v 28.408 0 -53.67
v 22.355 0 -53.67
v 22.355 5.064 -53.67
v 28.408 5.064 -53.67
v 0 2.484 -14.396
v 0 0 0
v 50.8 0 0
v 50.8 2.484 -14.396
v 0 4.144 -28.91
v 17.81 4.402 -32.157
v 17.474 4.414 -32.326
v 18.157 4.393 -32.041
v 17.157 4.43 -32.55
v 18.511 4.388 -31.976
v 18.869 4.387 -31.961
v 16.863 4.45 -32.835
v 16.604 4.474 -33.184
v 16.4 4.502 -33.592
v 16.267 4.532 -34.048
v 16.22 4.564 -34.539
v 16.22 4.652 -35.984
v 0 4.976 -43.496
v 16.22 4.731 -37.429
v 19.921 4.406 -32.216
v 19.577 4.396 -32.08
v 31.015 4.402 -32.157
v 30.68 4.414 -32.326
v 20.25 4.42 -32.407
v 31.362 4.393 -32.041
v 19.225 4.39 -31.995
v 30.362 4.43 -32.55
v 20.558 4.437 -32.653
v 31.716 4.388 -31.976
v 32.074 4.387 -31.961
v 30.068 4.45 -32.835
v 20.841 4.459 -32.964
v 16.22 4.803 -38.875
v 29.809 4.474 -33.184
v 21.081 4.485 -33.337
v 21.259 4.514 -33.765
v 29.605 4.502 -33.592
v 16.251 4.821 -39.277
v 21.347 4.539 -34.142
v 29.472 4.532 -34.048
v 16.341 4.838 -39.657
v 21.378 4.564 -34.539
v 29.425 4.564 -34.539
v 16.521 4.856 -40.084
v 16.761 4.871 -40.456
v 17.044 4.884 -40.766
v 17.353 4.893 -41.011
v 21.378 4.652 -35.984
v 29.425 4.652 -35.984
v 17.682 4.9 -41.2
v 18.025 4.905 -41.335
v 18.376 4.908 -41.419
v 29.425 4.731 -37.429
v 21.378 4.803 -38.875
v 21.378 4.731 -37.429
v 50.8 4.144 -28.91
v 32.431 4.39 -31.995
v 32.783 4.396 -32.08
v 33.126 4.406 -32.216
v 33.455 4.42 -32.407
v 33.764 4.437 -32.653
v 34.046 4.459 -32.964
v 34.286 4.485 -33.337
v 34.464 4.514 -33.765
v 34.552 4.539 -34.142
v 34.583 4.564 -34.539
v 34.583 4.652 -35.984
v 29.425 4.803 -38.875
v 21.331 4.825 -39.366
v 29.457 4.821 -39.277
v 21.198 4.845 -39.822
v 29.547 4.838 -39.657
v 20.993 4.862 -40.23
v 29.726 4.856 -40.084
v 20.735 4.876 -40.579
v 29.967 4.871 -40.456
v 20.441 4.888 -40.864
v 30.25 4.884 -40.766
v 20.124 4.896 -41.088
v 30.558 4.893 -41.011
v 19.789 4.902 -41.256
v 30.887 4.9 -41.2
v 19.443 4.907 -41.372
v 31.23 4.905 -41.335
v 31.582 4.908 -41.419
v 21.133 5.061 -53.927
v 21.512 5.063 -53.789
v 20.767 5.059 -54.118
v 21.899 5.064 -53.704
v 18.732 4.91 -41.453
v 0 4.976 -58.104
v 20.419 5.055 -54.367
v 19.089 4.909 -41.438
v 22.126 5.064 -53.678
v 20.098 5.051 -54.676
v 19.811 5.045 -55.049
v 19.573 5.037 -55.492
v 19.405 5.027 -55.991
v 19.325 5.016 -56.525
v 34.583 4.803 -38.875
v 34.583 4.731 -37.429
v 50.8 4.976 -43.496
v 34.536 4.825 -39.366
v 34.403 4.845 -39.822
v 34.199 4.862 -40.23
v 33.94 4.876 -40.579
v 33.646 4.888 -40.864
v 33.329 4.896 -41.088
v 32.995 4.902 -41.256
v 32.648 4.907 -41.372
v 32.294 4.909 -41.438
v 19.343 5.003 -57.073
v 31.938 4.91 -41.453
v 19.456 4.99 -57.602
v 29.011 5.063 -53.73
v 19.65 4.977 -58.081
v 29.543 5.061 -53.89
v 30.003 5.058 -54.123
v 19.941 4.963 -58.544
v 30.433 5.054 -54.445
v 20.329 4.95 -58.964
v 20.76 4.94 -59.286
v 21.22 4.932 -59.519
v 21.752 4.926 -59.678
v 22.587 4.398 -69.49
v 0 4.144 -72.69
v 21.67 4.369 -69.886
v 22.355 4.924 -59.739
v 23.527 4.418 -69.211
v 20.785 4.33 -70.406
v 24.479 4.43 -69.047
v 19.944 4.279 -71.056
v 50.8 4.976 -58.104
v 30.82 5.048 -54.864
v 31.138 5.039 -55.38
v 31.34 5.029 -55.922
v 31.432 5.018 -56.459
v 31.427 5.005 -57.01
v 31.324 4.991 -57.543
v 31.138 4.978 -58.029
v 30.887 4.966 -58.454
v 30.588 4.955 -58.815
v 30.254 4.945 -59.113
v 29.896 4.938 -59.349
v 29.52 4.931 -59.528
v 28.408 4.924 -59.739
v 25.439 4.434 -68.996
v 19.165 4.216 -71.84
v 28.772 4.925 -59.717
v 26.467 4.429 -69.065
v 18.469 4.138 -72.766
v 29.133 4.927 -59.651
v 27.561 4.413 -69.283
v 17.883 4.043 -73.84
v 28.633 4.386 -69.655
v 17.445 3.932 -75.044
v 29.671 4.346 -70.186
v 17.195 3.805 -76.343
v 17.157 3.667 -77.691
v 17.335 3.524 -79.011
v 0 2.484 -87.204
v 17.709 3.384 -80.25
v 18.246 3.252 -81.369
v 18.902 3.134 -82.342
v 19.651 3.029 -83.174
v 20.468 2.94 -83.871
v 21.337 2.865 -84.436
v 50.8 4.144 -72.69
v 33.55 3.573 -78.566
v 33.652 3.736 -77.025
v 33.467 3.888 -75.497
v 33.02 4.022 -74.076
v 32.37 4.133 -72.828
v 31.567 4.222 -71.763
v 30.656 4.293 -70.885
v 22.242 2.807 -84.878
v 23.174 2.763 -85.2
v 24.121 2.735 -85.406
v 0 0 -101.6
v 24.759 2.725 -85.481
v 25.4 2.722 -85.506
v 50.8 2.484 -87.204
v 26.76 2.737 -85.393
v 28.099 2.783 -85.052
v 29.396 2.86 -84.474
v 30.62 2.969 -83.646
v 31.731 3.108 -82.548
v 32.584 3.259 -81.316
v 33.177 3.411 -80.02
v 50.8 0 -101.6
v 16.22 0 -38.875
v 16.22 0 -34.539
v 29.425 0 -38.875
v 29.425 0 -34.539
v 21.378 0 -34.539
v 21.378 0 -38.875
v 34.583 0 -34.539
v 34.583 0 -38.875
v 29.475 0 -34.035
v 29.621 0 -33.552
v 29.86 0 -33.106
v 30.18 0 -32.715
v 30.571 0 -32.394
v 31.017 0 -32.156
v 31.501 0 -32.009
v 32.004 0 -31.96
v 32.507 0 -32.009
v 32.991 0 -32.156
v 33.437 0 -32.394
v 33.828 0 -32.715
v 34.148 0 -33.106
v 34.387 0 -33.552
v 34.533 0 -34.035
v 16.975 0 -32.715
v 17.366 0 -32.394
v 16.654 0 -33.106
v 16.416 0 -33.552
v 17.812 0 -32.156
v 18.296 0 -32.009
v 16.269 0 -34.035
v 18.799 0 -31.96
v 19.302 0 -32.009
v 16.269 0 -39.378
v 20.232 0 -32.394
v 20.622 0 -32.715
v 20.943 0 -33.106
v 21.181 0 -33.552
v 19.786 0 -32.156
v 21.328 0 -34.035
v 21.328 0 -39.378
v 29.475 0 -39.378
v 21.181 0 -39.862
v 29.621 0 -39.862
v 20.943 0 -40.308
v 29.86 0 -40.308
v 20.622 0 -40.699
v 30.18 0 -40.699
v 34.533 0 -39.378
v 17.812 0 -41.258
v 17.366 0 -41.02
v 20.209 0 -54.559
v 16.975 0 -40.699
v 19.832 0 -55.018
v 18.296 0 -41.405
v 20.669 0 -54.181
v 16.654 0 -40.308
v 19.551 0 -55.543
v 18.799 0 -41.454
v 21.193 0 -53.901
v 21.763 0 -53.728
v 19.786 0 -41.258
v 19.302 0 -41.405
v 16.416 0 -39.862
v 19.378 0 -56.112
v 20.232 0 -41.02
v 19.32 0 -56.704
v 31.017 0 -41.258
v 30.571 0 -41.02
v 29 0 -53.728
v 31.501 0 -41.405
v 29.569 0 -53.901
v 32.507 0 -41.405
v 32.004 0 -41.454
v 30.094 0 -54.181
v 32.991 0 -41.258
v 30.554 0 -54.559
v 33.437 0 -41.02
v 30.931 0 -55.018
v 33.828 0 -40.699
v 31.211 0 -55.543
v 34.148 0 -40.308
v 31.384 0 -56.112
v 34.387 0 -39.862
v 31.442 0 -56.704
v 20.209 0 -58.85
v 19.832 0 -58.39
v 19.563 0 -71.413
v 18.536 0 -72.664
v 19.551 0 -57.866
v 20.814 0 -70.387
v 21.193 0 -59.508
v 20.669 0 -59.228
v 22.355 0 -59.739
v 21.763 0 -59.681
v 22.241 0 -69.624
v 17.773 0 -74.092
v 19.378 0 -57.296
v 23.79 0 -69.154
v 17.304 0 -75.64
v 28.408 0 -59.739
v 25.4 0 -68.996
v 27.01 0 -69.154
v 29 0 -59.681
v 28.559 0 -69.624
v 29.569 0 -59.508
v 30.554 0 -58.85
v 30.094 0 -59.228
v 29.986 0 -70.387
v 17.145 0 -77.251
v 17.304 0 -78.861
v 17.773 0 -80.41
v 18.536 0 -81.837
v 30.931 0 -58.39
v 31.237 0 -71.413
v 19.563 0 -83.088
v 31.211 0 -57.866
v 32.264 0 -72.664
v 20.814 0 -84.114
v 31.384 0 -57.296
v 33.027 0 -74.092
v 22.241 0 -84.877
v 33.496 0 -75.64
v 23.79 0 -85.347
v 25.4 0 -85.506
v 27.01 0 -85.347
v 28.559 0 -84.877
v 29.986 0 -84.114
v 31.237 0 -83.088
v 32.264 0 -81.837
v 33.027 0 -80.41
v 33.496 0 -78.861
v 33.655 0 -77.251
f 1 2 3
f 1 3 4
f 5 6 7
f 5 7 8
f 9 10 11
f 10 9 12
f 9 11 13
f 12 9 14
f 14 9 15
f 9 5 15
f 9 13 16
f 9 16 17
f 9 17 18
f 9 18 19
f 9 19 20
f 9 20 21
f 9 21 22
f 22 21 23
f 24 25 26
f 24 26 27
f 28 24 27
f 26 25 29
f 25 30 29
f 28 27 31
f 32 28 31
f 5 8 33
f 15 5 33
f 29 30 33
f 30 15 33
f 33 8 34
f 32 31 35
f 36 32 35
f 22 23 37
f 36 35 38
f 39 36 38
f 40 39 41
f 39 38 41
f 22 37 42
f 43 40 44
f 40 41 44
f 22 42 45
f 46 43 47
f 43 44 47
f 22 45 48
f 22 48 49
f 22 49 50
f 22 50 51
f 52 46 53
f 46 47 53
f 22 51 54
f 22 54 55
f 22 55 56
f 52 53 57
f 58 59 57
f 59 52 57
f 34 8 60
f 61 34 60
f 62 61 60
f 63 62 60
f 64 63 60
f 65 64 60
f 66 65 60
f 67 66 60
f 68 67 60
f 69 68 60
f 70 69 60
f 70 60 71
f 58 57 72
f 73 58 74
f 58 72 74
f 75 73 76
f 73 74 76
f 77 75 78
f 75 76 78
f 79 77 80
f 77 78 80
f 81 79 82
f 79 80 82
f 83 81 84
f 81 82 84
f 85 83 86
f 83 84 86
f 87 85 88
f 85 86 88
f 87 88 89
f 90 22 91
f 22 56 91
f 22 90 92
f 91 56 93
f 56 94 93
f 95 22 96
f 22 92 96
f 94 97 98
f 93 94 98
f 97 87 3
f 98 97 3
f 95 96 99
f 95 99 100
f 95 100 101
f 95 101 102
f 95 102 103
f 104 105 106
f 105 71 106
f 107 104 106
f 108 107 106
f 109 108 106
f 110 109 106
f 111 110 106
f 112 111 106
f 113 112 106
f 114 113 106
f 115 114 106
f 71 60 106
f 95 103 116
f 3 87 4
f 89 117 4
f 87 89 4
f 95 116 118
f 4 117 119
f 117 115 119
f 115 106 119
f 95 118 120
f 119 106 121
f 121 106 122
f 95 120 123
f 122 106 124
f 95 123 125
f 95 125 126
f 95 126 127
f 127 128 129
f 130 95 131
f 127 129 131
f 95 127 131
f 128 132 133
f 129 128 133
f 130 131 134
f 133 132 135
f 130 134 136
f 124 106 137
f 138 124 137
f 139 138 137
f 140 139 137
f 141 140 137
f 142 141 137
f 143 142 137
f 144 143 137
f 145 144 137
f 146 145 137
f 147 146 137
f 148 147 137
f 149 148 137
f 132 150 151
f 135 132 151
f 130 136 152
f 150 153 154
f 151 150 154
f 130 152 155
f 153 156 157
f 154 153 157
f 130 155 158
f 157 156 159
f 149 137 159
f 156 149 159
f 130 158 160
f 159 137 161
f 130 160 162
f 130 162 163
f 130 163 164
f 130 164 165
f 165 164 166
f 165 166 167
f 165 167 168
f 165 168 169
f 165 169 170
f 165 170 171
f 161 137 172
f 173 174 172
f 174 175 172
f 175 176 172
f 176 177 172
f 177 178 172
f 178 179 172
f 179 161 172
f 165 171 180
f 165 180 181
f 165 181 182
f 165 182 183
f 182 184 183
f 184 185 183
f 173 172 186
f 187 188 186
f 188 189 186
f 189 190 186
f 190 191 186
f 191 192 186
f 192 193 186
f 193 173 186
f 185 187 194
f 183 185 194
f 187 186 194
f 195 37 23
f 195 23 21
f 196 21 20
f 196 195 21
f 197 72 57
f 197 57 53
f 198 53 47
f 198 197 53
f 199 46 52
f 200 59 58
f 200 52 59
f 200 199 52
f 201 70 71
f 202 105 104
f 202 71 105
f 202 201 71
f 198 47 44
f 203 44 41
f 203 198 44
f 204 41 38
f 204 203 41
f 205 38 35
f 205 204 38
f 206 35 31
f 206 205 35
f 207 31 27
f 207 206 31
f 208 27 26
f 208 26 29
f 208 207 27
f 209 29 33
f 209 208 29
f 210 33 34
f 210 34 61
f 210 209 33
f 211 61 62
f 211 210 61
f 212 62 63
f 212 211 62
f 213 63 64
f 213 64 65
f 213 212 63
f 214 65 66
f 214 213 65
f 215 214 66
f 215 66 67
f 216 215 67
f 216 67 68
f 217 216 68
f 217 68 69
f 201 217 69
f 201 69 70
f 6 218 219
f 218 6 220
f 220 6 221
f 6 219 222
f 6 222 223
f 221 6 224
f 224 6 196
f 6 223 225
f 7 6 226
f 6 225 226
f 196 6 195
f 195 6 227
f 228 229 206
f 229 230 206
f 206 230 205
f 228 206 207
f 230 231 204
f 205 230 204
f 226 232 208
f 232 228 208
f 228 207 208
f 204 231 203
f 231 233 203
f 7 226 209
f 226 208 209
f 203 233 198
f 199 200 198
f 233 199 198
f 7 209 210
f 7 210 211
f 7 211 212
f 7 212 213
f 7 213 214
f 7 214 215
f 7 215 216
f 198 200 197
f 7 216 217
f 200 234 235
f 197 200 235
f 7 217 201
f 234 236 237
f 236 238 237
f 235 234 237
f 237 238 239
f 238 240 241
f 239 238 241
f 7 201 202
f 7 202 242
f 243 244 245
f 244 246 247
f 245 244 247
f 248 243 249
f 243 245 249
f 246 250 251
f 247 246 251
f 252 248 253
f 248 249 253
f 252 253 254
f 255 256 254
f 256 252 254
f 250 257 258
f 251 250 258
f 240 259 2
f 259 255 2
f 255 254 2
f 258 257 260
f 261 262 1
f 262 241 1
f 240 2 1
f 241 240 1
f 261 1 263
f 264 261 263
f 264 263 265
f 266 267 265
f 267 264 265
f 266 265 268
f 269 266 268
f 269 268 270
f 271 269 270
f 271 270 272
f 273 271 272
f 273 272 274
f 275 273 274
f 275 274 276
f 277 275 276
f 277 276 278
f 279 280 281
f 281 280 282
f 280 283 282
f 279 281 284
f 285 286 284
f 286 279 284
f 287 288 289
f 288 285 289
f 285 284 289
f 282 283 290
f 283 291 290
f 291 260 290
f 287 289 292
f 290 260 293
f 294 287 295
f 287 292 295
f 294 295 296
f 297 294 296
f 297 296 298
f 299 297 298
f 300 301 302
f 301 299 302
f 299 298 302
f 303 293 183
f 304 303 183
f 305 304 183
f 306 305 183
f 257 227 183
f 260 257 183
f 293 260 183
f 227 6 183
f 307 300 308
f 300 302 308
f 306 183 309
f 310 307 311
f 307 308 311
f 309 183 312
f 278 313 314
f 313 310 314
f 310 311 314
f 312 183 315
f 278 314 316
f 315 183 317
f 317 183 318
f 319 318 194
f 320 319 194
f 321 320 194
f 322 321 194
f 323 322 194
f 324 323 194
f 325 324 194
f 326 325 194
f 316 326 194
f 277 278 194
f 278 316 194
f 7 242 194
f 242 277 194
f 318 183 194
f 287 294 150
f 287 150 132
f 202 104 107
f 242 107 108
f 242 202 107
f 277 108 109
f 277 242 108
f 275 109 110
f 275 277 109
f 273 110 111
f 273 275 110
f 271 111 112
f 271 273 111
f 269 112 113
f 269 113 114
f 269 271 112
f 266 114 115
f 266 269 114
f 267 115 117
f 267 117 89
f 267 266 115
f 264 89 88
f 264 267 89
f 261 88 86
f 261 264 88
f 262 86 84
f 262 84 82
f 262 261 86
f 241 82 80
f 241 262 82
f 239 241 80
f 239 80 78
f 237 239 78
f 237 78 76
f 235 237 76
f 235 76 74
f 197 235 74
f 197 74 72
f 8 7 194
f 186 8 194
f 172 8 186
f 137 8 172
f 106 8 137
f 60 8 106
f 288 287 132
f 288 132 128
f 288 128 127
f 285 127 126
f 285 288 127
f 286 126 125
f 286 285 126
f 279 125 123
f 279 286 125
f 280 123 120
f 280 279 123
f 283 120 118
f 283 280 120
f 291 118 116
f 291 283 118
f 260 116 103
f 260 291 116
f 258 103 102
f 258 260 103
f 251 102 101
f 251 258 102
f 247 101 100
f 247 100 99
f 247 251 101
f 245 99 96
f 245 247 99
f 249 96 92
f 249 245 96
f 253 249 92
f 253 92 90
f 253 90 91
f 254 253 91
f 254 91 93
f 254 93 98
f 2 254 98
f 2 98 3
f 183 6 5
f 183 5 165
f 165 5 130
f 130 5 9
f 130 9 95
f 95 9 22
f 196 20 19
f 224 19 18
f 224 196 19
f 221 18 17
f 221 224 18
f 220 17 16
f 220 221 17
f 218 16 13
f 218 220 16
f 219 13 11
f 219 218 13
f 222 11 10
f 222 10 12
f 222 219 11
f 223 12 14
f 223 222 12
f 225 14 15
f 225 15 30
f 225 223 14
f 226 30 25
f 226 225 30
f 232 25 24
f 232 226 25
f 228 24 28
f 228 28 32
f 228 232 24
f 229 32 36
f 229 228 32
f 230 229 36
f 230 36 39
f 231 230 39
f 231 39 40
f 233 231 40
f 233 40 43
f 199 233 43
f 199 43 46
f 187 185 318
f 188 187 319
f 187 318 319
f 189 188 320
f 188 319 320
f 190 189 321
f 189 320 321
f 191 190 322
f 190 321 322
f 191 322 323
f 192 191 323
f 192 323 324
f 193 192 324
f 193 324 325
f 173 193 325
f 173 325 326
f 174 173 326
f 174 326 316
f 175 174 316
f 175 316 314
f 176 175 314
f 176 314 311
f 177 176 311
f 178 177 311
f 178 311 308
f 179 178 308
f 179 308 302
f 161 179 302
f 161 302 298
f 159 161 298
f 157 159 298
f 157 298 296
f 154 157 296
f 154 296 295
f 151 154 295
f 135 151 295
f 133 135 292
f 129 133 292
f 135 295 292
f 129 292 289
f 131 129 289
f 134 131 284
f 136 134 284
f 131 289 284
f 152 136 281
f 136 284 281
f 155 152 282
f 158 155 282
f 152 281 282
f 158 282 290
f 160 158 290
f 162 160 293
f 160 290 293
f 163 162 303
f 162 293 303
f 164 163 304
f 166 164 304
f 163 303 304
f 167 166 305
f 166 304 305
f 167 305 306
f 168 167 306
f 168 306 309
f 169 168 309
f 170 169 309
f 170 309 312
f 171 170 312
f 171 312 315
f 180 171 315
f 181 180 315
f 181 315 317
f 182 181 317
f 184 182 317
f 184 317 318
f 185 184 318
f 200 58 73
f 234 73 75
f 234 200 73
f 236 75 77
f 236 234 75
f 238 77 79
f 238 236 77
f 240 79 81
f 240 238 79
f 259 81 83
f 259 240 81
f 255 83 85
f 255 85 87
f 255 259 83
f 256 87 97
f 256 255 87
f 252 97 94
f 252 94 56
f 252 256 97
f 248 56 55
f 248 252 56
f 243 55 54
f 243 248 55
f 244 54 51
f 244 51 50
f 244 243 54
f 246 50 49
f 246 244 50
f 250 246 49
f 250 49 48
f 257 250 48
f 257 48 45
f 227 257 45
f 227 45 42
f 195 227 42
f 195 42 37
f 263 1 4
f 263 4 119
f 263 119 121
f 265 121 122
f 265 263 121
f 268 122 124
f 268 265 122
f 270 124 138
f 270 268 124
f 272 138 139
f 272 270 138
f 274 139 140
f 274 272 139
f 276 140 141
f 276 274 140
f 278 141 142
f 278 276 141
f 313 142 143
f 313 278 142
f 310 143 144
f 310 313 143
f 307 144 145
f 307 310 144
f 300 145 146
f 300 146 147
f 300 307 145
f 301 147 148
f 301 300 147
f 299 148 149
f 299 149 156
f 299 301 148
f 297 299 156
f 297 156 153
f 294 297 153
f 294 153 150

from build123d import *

# Parameters (mm, degrees)
SKETCH1_W           = 50.8
SKETCH1_H           = 101.6
BOSS_EXTRUDE1_DEPTH = 76.962
CUT_EXTRUDE1_DEPTH  = 138.209144899
SKETCH6_R           = 8.255
CUT_EXTRUDE2_DEPTH  = 114.705788771
CUT_EXTRUDE3_DEPTH  = 114.705788909


with BuildPart() as part:
    # Sketch1 → Boss-Extrude1 (new body)
    with BuildSketch(Plane(origin=(0, 0, 0), x_dir=(1, 0, 0), z_dir=(0, 1, 0))):
        with Locations((25.4, 50.8)):
            Rectangle(SKETCH1_W, SKETCH1_H)
    extrude(amount=BOSS_EXTRUDE1_DEPTH)

    # Sketch2 → Cut-Extrude1 (cut, through all)
    with BuildSketch(Plane(origin=(50.8, 0, 0), x_dir=(0, 0, -1), z_dir=(1, 0, 0))):
        with BuildLine():
            ThreePointArc((0, 0), (50.8, 5.08), (101.6, 0))
            Line((101.6, 0), (101.6, 76.962))
            Line((101.6, 76.962), (0, 76.962))
            Line((0, 76.962), (0, 0))
        make_face()
    extrude(amount=-CUT_EXTRUDE1_DEPTH, mode=Mode.SUBTRACT)

    # Sketch6 → Cut-Extrude2 (cut, through all)
    with BuildSketch(Plane.XZ):
        with Locations(Location((25.4, -77.250605012, 0), (0, 0, 270))):
            Circle(SKETCH6_R)
    extrude(amount=-CUT_EXTRUDE2_DEPTH, mode=Mode.SUBTRACT)

    # Sketch5 → Cut-Extrude3 (cut, through all)
    with BuildSketch(Plane.XZ):
        with BuildLine():
            Line((21.377665877, -34.538594366), (21.377665877, -38.875260441))
            ThreePointArc((21.377665877, -38.875260441), (18.798754023, -41.454172295), (16.219842169, -38.875260441))
            Line((16.219842169, -38.875260441), (16.219842169, -34.538594366))
            ThreePointArc((16.219842169, -34.538594366), (18.798754023, -31.959682512), (21.377665877, -34.538594366))
        make_face()
        with BuildLine():
            Line((34.582973156, -34.538594366), (34.582973156, -38.875260441))
            ThreePointArc((34.582973156, -38.875260441), (32.004061302, -41.454172295), (29.425149448, -38.875260441))
            Line((29.425149448, -38.875260441), (29.425149448, -34.538594366))
            ThreePointArc((29.425149448, -34.538594366), (32.004061302, -31.959682512), (34.582973156, -34.538594366))
        make_face()
        with BuildLine():
            Line((22.354769429, -53.669734582), (28.407840078, -53.669734582))
            ThreePointArc((28.407840078, -53.669734582), (31.442451437, -56.704345941), (28.407840078, -59.7389573))
            Line((28.407840078, -59.7389573), (22.354769429, -59.7389573))
            ThreePointArc((22.354769429, -59.7389573), (19.32015807, -56.704345941), (22.354769429, -53.669734582))
        make_face()
    extrude(amount=-CUT_EXTRUDE3_DEPTH, mode=Mode.SUBTRACT)


solid = part.part
